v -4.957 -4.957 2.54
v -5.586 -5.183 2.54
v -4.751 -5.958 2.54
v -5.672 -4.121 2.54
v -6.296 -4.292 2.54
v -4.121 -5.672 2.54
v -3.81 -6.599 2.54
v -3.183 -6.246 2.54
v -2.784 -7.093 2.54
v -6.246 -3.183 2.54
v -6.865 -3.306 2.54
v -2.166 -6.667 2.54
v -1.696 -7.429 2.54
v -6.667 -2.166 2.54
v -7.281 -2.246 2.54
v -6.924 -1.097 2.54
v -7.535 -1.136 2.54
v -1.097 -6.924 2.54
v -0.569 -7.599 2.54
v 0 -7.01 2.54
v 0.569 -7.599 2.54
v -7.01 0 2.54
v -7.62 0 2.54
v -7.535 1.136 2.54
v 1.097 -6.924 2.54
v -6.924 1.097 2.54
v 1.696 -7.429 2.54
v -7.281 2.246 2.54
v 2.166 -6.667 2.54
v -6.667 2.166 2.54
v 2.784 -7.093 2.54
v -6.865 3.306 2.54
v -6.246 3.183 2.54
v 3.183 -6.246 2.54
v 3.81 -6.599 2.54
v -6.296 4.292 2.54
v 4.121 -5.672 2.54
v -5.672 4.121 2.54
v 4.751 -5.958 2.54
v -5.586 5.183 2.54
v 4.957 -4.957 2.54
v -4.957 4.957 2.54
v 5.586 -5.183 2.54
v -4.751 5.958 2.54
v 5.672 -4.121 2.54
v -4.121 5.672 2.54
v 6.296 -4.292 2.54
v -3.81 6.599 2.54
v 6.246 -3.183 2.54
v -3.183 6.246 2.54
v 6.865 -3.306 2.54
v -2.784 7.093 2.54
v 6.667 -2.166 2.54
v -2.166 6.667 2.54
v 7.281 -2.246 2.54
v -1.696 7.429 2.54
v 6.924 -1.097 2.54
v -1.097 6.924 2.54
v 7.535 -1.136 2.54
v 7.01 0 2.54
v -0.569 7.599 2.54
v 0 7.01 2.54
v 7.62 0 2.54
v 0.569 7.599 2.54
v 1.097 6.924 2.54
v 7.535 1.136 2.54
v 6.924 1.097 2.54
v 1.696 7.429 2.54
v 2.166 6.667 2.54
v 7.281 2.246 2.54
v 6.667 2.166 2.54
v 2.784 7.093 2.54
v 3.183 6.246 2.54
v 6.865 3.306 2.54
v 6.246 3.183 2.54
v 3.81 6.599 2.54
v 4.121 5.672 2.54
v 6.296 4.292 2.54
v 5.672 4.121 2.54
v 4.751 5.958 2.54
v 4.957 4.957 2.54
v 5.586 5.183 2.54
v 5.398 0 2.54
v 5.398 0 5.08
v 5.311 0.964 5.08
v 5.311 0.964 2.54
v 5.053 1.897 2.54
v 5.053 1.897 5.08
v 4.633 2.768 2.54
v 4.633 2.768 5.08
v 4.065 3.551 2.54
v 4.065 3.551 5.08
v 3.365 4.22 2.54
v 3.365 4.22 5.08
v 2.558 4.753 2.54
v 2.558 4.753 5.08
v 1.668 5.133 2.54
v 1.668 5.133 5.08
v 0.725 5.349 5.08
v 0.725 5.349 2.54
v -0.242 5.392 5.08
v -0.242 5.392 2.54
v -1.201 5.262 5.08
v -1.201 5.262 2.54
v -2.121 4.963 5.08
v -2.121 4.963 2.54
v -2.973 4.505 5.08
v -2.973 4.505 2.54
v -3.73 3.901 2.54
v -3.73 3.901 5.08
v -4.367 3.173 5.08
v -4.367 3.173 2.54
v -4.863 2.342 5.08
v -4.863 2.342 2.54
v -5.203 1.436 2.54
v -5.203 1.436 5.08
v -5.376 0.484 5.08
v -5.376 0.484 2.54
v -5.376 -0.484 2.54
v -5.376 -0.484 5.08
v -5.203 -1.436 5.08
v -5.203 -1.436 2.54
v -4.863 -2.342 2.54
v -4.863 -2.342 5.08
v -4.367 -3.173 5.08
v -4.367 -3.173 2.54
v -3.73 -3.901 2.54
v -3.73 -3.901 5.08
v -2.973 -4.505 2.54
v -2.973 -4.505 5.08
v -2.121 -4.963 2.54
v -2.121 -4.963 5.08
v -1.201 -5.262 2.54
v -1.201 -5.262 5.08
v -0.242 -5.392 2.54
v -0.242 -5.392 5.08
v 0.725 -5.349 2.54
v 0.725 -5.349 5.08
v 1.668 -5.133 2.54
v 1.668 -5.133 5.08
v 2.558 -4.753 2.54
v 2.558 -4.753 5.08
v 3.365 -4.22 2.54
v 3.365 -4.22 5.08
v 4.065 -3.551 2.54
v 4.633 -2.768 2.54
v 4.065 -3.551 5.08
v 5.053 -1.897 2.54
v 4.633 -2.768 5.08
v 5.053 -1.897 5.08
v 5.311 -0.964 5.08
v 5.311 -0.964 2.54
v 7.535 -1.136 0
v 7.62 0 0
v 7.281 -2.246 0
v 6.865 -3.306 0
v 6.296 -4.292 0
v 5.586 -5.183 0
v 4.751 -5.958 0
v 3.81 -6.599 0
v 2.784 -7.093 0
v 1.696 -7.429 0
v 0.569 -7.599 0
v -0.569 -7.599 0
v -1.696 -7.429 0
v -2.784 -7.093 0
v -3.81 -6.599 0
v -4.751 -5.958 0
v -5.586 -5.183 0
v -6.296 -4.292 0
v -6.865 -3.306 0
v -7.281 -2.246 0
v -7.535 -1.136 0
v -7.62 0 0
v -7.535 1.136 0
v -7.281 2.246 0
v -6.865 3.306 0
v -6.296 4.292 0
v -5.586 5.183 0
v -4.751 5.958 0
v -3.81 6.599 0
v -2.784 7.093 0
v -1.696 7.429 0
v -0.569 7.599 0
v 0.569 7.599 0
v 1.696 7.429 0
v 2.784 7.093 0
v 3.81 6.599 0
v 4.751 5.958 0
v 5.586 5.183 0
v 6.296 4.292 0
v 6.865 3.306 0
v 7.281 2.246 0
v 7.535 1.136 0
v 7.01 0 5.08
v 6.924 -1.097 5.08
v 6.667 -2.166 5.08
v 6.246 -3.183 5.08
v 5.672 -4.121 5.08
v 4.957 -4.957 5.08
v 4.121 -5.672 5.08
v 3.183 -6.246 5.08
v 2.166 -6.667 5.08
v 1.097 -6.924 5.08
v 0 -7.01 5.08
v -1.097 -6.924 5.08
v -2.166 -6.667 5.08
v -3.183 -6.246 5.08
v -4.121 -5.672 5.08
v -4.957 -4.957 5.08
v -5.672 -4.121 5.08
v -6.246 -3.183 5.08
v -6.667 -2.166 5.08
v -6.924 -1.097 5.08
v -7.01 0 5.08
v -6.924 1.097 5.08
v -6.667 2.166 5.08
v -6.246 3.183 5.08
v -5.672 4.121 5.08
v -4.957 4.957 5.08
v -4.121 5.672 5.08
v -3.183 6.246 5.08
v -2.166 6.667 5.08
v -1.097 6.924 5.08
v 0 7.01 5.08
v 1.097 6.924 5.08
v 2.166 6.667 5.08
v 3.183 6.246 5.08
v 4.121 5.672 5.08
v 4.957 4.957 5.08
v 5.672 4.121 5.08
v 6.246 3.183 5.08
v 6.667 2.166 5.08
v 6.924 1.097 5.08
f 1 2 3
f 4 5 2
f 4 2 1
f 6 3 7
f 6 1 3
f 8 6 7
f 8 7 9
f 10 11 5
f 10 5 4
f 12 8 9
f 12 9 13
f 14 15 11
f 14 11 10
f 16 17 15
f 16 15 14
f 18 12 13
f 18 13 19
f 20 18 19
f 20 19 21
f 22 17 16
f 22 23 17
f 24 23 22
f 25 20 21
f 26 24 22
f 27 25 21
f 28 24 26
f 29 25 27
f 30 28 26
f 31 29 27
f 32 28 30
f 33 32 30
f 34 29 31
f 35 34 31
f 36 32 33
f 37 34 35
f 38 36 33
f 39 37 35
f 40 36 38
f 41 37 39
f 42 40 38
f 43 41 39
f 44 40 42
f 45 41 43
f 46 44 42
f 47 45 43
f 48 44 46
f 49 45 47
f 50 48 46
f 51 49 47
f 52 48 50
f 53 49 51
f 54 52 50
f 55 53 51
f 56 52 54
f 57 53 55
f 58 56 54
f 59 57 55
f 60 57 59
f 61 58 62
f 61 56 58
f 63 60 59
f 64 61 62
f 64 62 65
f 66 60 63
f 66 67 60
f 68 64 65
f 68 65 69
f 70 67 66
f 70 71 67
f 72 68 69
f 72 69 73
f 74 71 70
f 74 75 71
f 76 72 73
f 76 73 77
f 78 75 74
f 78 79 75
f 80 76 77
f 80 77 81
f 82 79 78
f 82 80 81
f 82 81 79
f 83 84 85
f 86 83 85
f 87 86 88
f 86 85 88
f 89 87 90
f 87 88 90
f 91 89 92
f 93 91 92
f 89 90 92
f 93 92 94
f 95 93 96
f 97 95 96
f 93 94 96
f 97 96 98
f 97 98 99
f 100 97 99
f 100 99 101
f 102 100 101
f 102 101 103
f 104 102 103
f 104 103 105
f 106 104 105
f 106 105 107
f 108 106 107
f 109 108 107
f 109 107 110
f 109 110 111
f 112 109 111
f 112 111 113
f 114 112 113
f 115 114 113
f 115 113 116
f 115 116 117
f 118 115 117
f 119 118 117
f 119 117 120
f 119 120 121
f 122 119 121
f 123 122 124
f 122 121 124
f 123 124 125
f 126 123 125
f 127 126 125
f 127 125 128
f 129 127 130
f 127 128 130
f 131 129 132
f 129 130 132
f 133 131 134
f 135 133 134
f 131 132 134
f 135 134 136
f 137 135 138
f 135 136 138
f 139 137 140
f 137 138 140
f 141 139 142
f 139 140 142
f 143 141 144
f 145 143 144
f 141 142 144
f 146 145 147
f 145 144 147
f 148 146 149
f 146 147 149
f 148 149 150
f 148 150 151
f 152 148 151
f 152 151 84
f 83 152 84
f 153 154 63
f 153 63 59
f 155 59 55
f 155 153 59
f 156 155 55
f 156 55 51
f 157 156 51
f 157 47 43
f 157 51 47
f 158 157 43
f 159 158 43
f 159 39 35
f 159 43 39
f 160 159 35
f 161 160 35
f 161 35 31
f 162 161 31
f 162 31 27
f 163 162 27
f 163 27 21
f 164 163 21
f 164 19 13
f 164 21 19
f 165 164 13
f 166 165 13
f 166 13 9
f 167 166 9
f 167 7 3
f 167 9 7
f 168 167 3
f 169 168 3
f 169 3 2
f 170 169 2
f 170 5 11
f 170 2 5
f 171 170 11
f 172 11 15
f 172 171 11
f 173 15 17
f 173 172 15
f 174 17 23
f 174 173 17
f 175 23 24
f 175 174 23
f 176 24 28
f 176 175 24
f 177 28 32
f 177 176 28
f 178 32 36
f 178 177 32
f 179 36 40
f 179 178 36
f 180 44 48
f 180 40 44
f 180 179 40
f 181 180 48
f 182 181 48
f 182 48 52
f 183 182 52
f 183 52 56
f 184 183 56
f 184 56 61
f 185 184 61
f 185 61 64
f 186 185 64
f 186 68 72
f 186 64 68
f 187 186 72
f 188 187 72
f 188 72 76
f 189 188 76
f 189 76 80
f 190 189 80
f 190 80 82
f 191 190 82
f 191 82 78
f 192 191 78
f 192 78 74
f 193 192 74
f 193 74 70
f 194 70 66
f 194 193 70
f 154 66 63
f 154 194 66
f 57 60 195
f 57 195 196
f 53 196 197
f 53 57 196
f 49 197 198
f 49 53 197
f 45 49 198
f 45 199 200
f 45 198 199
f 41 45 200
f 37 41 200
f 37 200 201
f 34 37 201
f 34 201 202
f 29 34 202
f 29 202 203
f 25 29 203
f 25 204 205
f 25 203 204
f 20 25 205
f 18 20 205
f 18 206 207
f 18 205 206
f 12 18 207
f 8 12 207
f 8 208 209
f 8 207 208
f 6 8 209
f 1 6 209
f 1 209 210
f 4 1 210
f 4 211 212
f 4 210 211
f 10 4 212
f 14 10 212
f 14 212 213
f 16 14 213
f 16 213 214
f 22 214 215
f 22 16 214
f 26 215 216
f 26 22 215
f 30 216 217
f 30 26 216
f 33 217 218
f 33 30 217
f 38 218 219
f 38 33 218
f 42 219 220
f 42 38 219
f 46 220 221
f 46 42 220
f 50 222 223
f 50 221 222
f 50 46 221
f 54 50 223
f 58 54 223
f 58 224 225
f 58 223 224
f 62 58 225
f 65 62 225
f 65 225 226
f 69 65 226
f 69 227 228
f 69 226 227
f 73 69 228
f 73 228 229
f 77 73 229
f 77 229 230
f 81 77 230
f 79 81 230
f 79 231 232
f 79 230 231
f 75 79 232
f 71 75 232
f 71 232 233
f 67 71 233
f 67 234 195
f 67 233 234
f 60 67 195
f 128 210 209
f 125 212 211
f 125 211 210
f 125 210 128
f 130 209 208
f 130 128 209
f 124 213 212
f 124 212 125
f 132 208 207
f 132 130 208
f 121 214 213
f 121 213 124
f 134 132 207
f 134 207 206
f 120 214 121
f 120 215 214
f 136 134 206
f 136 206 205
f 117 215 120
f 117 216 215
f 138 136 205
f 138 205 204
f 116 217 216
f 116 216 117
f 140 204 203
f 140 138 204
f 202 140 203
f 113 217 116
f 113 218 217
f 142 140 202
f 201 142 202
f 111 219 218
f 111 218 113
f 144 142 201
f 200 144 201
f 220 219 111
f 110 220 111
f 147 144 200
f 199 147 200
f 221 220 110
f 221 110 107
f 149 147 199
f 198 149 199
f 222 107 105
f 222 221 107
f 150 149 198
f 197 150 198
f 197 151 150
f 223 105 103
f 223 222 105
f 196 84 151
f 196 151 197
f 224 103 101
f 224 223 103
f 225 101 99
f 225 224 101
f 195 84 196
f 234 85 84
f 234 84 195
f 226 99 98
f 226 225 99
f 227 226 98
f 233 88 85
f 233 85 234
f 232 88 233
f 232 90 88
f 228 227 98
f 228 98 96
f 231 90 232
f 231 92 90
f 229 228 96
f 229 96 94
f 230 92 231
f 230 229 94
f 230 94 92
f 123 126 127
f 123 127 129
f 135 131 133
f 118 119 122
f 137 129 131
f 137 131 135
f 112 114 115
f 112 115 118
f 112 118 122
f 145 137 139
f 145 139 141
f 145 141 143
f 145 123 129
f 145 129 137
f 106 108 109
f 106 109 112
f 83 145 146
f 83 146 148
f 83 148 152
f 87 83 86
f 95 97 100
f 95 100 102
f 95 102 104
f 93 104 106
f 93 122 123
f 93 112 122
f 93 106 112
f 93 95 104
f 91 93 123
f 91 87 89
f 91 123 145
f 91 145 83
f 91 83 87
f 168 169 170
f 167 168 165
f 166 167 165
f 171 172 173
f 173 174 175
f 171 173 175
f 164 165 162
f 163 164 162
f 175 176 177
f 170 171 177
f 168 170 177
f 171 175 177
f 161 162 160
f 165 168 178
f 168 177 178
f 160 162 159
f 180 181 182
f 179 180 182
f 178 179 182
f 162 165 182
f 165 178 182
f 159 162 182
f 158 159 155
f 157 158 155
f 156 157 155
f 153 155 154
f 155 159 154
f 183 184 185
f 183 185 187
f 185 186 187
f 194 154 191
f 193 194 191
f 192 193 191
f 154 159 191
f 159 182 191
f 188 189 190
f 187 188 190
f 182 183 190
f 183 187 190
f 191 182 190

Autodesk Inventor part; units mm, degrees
ref_plane "YZ Plane" through (0, 0, 0) normal (1, 0, 0) x (0, 1, 0)
ref_plane "XZ Plane" through (0, 0, 0) normal (0, 1, 0) x (-1, 0, 0)
ref_plane "XY Plane" through (0, 0, 0) normal (0, 0, 1) x (1, 0, 0)
sketch "Sketch1" plane through (0, 0, 0) normal (0, 0, 1) x (1, 0, 0)
  circle A0 centre (0, 0) radius 7.62
  dimension "d0" = 15.24
extrude "Extrusion1" add sketch "Sketch1" along normal blind 2.54
sketch "Sketch2" plane through (0, 0, 2.54) normal (0, 0, 1) x (1, 0, 0)
  circle A0 centre (0, 0) radius 7.62 projected
  circle A1 centre (0, 0) radius 7.0104
  dimension "d3" = 14.0208
extrude "Extrusion2" add sketch "Sketch2" along normal blind 2.54 contours A1
thread "Thread1" size "4-40 UNC" class "2A" standard "ANSI Unified Screw Threads" full length
sketch "Sketch3" plane through (0, 0, 5.08) normal (0, 0, 1) x (1, 0, 0)
  circle A0 centre (0, 0) radius 7.0104 projected
  circle A1 centre (0, 0) radius 5.3975
  dimension "d8" = 10.795
extrude "Extrusion3" cut sketch "Sketch3" against normal blind 2.54 contours A1
properties part number "cap_a"
